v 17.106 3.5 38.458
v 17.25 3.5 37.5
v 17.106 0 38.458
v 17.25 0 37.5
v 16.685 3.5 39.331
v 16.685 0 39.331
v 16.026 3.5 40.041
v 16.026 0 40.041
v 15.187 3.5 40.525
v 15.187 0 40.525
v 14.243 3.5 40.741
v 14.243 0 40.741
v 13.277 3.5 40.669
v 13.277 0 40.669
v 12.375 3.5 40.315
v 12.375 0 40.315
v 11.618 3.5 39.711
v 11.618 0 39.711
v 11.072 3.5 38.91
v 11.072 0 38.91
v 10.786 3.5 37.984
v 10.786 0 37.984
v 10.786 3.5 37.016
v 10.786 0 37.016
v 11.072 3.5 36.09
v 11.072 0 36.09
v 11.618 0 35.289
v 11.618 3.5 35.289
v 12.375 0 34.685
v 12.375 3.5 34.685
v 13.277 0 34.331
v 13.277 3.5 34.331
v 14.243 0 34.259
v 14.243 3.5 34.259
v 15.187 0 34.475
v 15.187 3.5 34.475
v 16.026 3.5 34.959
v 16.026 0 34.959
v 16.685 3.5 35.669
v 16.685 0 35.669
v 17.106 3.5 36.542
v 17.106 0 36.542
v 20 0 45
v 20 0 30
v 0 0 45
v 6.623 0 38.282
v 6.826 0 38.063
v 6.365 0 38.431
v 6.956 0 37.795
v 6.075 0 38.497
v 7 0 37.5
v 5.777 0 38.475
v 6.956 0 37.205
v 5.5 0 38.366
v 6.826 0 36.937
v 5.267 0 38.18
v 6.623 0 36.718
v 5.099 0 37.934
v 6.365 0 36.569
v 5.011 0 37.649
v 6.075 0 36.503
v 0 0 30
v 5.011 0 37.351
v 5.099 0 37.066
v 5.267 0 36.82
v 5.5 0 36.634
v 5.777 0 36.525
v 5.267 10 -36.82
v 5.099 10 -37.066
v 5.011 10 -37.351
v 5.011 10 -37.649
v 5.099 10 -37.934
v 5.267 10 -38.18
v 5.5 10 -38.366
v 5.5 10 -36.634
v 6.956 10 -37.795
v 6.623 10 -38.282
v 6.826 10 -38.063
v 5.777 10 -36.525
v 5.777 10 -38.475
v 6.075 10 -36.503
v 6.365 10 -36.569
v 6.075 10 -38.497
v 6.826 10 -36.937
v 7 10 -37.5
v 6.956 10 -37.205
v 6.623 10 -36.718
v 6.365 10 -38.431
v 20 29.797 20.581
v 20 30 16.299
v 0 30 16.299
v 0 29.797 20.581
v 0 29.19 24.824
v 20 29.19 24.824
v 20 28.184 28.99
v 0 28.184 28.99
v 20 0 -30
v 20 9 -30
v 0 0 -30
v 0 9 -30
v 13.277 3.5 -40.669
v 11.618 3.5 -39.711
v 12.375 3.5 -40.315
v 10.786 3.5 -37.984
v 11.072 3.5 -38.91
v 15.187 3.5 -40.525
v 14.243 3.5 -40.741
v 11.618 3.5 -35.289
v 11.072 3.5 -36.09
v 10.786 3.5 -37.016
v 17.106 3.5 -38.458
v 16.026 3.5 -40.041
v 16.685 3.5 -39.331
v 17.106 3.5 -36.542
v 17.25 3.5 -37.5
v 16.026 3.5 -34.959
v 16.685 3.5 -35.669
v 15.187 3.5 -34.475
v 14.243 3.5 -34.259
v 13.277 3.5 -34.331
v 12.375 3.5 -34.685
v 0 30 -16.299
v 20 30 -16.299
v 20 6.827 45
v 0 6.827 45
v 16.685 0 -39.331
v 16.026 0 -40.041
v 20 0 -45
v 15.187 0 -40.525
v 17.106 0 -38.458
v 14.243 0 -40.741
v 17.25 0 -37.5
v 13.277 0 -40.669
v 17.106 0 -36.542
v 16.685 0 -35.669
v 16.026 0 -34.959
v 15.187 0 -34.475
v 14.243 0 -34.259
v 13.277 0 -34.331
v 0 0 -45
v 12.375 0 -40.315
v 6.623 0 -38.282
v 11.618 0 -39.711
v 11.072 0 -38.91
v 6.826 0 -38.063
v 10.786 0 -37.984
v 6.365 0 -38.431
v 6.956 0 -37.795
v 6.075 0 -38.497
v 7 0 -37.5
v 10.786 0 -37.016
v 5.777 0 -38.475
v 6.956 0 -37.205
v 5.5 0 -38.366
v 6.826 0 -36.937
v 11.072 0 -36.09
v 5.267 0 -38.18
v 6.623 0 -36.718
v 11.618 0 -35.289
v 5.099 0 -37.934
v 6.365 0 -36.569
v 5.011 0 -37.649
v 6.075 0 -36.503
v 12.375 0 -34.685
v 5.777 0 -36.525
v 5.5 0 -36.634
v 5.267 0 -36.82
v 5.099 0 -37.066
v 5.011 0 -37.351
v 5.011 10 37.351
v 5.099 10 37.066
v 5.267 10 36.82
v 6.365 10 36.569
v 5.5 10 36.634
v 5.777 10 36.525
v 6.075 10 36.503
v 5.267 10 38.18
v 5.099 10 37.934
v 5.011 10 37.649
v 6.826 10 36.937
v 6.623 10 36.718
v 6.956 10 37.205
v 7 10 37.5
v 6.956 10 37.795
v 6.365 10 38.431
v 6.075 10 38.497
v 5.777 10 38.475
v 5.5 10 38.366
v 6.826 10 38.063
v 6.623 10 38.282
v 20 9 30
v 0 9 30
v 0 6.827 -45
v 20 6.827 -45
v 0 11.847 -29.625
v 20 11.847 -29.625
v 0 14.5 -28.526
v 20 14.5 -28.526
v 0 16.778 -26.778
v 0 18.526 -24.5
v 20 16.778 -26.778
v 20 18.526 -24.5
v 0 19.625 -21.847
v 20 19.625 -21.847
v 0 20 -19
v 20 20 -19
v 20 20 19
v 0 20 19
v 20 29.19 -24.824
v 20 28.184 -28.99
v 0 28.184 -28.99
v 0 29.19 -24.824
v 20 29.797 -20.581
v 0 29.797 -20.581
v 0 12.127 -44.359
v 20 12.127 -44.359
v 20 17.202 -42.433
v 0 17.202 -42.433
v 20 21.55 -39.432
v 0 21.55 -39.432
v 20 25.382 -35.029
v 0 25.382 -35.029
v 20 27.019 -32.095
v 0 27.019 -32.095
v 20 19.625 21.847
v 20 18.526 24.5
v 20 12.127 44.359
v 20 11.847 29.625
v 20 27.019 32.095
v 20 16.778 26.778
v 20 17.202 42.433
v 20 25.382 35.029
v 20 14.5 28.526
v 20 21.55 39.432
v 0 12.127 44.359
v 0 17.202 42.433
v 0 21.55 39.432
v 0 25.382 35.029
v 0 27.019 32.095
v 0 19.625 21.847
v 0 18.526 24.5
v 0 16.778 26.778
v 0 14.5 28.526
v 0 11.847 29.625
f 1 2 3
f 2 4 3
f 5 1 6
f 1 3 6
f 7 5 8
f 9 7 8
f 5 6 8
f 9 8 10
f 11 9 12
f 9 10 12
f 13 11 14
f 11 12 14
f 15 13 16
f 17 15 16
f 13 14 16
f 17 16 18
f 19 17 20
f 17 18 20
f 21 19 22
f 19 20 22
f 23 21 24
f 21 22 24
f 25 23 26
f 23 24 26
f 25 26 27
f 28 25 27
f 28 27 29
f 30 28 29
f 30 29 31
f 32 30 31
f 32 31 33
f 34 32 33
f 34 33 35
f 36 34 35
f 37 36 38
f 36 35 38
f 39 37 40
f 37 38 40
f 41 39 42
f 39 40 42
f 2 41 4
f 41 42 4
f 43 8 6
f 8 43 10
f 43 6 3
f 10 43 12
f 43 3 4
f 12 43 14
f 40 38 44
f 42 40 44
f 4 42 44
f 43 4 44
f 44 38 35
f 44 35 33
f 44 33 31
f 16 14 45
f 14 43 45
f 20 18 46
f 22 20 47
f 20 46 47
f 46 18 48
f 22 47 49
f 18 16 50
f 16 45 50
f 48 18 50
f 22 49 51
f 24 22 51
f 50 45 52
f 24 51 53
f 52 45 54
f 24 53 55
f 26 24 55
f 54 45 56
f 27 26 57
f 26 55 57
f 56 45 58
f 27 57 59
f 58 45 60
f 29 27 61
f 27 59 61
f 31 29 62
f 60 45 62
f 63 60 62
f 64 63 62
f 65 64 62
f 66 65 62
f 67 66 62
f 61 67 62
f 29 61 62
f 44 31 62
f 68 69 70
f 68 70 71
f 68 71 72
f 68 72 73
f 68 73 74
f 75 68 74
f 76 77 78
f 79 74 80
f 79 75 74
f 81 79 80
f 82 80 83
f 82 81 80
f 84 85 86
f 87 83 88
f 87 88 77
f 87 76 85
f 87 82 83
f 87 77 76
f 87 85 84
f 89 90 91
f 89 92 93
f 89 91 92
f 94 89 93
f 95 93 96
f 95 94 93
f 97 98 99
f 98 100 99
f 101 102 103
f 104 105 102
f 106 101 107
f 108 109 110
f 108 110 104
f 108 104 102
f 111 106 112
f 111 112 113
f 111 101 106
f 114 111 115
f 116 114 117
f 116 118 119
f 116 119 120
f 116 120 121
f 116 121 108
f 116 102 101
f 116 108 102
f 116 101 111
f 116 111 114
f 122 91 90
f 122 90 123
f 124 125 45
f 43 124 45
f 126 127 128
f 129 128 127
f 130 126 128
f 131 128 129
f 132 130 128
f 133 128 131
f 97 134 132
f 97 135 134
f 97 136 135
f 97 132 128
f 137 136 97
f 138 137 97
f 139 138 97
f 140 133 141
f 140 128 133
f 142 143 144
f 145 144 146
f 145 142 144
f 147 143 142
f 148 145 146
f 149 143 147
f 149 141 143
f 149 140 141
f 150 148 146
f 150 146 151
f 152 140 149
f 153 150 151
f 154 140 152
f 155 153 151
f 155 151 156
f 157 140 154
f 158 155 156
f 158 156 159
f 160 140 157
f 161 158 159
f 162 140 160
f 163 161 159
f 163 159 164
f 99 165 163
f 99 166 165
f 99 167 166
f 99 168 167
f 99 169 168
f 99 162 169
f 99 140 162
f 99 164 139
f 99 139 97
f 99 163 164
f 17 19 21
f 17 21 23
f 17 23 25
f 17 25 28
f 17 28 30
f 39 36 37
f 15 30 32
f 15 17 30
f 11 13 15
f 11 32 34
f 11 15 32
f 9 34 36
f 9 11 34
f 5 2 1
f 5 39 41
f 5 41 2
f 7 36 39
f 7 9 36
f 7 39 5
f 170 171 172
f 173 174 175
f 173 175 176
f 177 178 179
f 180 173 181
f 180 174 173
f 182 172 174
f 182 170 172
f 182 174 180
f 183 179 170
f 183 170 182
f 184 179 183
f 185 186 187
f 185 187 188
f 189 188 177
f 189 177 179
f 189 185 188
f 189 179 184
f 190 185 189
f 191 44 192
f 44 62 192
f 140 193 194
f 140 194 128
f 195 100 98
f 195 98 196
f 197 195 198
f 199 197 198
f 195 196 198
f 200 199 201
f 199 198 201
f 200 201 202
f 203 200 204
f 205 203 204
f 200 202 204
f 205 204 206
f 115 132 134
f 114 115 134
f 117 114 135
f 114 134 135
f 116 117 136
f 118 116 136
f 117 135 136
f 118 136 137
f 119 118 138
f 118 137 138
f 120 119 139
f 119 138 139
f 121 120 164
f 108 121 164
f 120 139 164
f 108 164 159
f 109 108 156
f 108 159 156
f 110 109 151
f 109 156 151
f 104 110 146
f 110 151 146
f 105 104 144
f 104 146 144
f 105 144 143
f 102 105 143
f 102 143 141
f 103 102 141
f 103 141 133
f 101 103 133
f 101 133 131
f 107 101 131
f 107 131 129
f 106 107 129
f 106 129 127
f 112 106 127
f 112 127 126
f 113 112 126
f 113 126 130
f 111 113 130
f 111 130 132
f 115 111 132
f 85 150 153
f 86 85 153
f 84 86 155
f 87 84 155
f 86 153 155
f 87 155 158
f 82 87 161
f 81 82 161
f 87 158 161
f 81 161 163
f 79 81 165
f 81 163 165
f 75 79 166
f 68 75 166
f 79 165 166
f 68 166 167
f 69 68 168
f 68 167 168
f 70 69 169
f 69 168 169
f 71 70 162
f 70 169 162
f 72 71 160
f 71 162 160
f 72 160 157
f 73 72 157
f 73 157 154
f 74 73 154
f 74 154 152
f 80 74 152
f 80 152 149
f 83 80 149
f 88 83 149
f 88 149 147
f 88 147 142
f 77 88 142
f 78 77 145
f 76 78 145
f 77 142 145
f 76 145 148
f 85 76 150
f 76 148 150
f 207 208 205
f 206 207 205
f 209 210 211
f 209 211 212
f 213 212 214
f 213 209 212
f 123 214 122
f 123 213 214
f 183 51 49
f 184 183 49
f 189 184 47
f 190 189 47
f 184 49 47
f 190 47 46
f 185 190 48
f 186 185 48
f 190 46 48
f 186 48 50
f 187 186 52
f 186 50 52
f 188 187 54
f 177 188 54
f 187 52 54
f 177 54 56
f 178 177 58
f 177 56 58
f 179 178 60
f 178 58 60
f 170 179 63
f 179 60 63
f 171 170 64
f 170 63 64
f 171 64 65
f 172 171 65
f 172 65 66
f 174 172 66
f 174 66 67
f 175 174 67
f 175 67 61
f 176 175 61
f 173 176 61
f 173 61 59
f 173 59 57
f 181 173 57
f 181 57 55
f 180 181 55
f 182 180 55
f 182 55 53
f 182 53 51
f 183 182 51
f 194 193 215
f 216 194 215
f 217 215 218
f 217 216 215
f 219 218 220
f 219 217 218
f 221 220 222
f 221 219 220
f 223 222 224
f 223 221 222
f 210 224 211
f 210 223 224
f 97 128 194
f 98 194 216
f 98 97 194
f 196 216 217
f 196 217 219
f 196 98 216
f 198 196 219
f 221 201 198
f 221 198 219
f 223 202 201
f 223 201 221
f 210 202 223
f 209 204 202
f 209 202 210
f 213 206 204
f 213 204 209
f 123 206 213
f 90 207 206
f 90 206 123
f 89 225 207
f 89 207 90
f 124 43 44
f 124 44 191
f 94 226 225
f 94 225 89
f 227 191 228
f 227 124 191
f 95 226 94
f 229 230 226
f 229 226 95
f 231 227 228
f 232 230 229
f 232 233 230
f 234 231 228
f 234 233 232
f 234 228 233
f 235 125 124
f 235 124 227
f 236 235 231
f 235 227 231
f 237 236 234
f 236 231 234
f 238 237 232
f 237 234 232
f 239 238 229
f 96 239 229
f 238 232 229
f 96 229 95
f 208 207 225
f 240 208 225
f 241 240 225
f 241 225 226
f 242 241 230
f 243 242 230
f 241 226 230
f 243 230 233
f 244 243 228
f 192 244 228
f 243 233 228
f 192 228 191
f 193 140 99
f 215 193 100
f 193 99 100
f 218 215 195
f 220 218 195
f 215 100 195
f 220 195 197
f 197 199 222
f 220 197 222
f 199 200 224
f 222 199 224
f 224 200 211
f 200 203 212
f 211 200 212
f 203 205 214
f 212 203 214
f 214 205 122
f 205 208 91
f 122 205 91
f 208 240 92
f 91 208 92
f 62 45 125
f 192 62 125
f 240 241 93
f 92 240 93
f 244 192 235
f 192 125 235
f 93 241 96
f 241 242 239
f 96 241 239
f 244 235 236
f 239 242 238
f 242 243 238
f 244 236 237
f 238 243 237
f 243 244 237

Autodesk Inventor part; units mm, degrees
ref_plane "YZ Plane" through (0, 0, 0) normal (1, 0, 0) x (0, 1, 0)
ref_plane "XZ Plane" through (0, 0, 0) normal (0, 1, 0) x (-1, 0, 0)
ref_plane "XY Plane" through (0, 0, 0) normal (0, 0, 1) x (1, 0, 0)
sketch "Sketch1" plane through (0, 0, 0) normal (1, 0, 0) x (0, 1, 0)
  line L0 (0, 0) -> (0, 30)
  line L1 (0, 30) -> (20, 30)
  line L2 (20, 30) -> (20, -60)
  line L3 (20, -60) -> (0, -60)
  line L4 (0, -60) -> (0, 30)
  line L5 (20, 30) -> (30, 30)
  line L6 (30, 30) -> (30, -30)
  line L7 (30, -30) -> (20, -30)
  line L8 (20, -30) -> (20, 30)
  line L9 (0, 30) -> (20, 30)
  line L10 (20, 30) -> (20, 45)
  line L11 (20, 45) -> (0, 45)
  line L12 (0, 45) -> (0, 30)
  line L13 (20, 0) -> (0, 0)
  line L14 (0, -60) -> (20, -30)
  line L15 (20, -30) -> (30, -30)
  line L16 (0, -60) -> (20, -30)
  line L17 (20, -30) -> (20, -45)
  line L18 (20, -45) -> (0, -45)
  line L19 (0, -45) -> (0, -60)
  line L20 (20, 45) -> (30, 30)
  line L21 (30, -30) -> (20, -45)
  line L22 (20, -30) -> (0, -30)
  point P0 (20, -30)
  point P1 (20, -30)
  point P2 (20, -30)
  point P3 (10, -45)
  point P4 (20, -30)
  point P5 (0, -45)
  point P6 (10, -45)
  dimension "d0" = 30
  dimension "d1" = 20
  dimension "d2" = 90
  dimension "d3" = 10
  dimension "d4" = 20
  dimension "d5" = 15
extrude "Extrusion1" add sketch "Sketch1" along normal blind 20 contours L12 L11 L10 L1 | L22 L14 L18 L4 | L2 L5 L6 L7 | L10 L20 L5 | L7 L21 L2 | L2 L18 L14
fillet "Fillet2" radius 45.25 2 edges at (10, 30, -30) (10, 30, 30)
fillet "Fillet3" radius 11 2 edges at (10, 20, 30) (10, 20, -30)
fillet "Fillet4" radius 22.25 2 edges at (10, 20, -45) (10, 20, 45)
sketch "Sketch3" plane through (0, 0, -45) normal (0, -1, 0) x (1, 0, 0)
  circle A0 centre (14, 7.5) radius 3.25
  line L0 (0, 0) -> (20, 0) projected
  circle A1 centre (6, 7.5) radius 1
  line L1 (0, 45) -> (21.3664, 45)
  circle A2 centre (14, 82.5) radius 3.25
  circle A3 centre (6, 82.5) radius 1
  line L2 (20, 15) -> (20, 0) projected
  line L3 (0, 15) -> (0, 0) projected
  point P0 (20, 90)
  point P1 (20, 7.5)
  dimension "d21" = 6.5
  dimension "d22" = 7.5
  dimension "d23" = 2
  dimension "d28" = 7.5
  dimension "d29" = 6
  dimension "d30" = 6
extrude "Extrusion4" cut sketch "Sketch3" against normal blind 3.5 contours A0 | A2
extrude "Extrusion5" cut sketch "Sketch3" against normal blind 10 contours A1 | A3
properties part number "Raczka"
